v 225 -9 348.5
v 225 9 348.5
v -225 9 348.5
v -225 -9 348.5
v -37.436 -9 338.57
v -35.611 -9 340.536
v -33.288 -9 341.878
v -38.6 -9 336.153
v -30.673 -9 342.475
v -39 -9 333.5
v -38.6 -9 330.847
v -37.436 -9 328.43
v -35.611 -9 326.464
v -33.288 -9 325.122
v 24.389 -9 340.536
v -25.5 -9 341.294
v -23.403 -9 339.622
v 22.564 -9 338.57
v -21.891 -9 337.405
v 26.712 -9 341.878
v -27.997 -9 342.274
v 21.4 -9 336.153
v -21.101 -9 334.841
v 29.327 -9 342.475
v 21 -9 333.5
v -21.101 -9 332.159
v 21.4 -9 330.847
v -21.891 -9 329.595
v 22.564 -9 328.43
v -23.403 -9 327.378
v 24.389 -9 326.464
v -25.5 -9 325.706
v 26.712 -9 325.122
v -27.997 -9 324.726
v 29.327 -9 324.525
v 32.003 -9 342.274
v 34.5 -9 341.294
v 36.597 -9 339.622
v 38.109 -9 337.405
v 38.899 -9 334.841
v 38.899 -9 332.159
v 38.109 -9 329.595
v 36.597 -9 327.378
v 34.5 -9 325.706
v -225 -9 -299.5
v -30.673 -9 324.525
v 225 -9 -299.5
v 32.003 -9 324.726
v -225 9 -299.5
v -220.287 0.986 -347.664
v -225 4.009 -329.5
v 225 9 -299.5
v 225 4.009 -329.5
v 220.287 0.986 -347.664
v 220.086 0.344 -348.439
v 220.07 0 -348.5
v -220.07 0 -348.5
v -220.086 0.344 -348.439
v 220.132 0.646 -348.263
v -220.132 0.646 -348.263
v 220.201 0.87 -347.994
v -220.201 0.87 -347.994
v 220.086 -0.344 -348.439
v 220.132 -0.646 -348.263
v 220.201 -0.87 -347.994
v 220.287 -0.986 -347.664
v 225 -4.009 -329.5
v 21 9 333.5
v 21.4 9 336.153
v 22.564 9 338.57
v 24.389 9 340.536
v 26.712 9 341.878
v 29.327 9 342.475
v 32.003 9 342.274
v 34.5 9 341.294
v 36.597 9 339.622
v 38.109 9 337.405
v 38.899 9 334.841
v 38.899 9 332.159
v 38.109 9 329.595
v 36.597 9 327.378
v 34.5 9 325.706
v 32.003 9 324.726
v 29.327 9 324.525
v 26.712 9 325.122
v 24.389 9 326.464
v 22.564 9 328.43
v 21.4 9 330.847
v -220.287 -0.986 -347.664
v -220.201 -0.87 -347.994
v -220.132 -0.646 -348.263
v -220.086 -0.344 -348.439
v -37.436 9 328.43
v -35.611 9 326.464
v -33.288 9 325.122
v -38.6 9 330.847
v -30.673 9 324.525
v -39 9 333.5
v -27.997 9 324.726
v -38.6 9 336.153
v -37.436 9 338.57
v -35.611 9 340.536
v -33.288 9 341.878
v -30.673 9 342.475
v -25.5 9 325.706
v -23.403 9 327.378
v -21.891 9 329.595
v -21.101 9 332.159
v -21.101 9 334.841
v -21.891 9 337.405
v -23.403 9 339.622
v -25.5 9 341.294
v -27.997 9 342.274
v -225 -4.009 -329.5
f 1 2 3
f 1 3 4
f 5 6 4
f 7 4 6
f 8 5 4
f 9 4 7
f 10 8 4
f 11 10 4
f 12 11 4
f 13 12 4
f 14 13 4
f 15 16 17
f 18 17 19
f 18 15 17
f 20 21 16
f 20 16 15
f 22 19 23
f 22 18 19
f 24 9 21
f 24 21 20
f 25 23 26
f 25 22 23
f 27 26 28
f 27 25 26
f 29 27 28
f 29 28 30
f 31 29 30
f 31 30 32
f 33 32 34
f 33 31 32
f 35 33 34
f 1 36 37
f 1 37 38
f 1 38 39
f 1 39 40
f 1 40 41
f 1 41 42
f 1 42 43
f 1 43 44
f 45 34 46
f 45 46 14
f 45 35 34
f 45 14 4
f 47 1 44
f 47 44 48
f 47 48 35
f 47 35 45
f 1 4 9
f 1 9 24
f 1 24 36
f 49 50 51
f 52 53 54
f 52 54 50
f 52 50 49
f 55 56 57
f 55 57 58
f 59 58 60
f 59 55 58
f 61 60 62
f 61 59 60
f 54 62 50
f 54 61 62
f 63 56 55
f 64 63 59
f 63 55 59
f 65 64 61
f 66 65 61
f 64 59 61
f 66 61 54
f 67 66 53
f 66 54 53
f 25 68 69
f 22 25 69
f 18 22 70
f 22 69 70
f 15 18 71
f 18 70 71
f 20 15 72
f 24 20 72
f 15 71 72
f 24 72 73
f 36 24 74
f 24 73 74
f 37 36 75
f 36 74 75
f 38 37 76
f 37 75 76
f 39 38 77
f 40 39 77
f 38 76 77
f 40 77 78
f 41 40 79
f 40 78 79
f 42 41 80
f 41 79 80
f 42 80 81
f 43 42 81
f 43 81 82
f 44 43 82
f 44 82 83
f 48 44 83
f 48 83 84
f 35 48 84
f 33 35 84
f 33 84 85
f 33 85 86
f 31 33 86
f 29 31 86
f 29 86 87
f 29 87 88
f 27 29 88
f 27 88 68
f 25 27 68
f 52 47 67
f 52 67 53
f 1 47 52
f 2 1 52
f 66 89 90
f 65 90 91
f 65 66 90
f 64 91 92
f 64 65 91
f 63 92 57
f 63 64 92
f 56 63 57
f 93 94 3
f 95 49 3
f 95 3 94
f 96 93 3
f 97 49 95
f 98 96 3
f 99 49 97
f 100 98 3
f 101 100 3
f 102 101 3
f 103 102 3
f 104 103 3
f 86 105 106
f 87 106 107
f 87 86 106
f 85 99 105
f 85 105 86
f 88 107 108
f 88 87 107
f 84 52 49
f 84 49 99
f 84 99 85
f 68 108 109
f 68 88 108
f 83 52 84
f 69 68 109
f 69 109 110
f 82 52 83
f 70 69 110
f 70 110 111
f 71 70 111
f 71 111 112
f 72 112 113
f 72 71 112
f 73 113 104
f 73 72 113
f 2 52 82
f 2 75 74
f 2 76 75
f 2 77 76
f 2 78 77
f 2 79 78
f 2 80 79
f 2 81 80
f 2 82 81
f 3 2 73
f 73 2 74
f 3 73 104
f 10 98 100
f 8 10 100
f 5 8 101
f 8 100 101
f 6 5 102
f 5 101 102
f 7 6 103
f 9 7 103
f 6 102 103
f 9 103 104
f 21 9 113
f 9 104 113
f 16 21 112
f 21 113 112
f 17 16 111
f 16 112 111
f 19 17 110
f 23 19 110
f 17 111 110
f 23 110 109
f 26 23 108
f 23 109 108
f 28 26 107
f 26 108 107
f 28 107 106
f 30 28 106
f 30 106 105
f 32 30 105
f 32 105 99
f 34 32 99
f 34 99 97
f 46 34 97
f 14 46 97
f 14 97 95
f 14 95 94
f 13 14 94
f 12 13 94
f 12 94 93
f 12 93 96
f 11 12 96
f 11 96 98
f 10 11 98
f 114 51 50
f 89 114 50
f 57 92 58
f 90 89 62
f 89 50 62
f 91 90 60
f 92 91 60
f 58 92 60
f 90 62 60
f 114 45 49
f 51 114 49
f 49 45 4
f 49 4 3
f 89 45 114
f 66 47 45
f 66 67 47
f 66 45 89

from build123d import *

# Parameters (mm, degrees)
F1_DEPTH = 225
F2_R     = 9
F3_DEPTH = 25


with BuildPart() as f1:
    # F0 (on Right) → F1 (new body, symmetric)
    with BuildSketch(Plane.YZ):
        with BuildLine():
            Line((9, -299.5), (9, 348.5))
            Line((9, 348.5), (-9, 348.5))
            Line((-9, 348.5), (-9, -299.5))
            Line((-9, -299.5), (-0.98644, -347.664124))
            ThreePointArc((-0.98644, -347.664124), (-0.082342, -346.503396), (1, -347.5))
            ThreePointArc((1, -347.5), (0.996604, -347.582342), (0.98644, -347.664124))
            Line((0.98644, -347.664124), (9, -299.5))
        make_face()
        with BuildLine():
            ThreePointArc((0, -348.5), (0.646481, -348.26293), (0.98644, -347.664124))
            ThreePointArc((0.98644, -347.664124), (0.996604, -347.582342), (1, -347.5))
            ThreePointArc((1, -347.5), (-0.082342, -346.503396), (-0.98644, -347.664124))
            ThreePointArc((-0.98644, -347.664124), (-0.646481, -348.26293), (0, -348.5))
        make_face()
    extrude(amount=F1_DEPTH, both=True)

    # F2 (on face) → F3 (cut)
    with BuildSketch(Plane(origin=(0, 9, 0), x_dir=(-1, 0, 0), z_dir=(0, 1, 0))):
        with Locations((30, 333.5)):
            Circle(F2_R)
        with BuildLine():
            ThreePointArc((-39, 333.5), (-30, 324.5), (-21, 333.5))
            ThreePointArc((-21, 333.5), (-30, 342.5), (-39, 333.5))
        make_face()
        Polygon((-220.070133, -348.5), (-225, -329.500129), (-225.070133, -348.5), align=None)
        Polygon((225.070133, -348.5), (225, -329.500129), (220.070133, -348.5), align=None)
    extrude(amount=-F3_DEPTH, mode=Mode.SUBTRACT)


solid = f1.part
